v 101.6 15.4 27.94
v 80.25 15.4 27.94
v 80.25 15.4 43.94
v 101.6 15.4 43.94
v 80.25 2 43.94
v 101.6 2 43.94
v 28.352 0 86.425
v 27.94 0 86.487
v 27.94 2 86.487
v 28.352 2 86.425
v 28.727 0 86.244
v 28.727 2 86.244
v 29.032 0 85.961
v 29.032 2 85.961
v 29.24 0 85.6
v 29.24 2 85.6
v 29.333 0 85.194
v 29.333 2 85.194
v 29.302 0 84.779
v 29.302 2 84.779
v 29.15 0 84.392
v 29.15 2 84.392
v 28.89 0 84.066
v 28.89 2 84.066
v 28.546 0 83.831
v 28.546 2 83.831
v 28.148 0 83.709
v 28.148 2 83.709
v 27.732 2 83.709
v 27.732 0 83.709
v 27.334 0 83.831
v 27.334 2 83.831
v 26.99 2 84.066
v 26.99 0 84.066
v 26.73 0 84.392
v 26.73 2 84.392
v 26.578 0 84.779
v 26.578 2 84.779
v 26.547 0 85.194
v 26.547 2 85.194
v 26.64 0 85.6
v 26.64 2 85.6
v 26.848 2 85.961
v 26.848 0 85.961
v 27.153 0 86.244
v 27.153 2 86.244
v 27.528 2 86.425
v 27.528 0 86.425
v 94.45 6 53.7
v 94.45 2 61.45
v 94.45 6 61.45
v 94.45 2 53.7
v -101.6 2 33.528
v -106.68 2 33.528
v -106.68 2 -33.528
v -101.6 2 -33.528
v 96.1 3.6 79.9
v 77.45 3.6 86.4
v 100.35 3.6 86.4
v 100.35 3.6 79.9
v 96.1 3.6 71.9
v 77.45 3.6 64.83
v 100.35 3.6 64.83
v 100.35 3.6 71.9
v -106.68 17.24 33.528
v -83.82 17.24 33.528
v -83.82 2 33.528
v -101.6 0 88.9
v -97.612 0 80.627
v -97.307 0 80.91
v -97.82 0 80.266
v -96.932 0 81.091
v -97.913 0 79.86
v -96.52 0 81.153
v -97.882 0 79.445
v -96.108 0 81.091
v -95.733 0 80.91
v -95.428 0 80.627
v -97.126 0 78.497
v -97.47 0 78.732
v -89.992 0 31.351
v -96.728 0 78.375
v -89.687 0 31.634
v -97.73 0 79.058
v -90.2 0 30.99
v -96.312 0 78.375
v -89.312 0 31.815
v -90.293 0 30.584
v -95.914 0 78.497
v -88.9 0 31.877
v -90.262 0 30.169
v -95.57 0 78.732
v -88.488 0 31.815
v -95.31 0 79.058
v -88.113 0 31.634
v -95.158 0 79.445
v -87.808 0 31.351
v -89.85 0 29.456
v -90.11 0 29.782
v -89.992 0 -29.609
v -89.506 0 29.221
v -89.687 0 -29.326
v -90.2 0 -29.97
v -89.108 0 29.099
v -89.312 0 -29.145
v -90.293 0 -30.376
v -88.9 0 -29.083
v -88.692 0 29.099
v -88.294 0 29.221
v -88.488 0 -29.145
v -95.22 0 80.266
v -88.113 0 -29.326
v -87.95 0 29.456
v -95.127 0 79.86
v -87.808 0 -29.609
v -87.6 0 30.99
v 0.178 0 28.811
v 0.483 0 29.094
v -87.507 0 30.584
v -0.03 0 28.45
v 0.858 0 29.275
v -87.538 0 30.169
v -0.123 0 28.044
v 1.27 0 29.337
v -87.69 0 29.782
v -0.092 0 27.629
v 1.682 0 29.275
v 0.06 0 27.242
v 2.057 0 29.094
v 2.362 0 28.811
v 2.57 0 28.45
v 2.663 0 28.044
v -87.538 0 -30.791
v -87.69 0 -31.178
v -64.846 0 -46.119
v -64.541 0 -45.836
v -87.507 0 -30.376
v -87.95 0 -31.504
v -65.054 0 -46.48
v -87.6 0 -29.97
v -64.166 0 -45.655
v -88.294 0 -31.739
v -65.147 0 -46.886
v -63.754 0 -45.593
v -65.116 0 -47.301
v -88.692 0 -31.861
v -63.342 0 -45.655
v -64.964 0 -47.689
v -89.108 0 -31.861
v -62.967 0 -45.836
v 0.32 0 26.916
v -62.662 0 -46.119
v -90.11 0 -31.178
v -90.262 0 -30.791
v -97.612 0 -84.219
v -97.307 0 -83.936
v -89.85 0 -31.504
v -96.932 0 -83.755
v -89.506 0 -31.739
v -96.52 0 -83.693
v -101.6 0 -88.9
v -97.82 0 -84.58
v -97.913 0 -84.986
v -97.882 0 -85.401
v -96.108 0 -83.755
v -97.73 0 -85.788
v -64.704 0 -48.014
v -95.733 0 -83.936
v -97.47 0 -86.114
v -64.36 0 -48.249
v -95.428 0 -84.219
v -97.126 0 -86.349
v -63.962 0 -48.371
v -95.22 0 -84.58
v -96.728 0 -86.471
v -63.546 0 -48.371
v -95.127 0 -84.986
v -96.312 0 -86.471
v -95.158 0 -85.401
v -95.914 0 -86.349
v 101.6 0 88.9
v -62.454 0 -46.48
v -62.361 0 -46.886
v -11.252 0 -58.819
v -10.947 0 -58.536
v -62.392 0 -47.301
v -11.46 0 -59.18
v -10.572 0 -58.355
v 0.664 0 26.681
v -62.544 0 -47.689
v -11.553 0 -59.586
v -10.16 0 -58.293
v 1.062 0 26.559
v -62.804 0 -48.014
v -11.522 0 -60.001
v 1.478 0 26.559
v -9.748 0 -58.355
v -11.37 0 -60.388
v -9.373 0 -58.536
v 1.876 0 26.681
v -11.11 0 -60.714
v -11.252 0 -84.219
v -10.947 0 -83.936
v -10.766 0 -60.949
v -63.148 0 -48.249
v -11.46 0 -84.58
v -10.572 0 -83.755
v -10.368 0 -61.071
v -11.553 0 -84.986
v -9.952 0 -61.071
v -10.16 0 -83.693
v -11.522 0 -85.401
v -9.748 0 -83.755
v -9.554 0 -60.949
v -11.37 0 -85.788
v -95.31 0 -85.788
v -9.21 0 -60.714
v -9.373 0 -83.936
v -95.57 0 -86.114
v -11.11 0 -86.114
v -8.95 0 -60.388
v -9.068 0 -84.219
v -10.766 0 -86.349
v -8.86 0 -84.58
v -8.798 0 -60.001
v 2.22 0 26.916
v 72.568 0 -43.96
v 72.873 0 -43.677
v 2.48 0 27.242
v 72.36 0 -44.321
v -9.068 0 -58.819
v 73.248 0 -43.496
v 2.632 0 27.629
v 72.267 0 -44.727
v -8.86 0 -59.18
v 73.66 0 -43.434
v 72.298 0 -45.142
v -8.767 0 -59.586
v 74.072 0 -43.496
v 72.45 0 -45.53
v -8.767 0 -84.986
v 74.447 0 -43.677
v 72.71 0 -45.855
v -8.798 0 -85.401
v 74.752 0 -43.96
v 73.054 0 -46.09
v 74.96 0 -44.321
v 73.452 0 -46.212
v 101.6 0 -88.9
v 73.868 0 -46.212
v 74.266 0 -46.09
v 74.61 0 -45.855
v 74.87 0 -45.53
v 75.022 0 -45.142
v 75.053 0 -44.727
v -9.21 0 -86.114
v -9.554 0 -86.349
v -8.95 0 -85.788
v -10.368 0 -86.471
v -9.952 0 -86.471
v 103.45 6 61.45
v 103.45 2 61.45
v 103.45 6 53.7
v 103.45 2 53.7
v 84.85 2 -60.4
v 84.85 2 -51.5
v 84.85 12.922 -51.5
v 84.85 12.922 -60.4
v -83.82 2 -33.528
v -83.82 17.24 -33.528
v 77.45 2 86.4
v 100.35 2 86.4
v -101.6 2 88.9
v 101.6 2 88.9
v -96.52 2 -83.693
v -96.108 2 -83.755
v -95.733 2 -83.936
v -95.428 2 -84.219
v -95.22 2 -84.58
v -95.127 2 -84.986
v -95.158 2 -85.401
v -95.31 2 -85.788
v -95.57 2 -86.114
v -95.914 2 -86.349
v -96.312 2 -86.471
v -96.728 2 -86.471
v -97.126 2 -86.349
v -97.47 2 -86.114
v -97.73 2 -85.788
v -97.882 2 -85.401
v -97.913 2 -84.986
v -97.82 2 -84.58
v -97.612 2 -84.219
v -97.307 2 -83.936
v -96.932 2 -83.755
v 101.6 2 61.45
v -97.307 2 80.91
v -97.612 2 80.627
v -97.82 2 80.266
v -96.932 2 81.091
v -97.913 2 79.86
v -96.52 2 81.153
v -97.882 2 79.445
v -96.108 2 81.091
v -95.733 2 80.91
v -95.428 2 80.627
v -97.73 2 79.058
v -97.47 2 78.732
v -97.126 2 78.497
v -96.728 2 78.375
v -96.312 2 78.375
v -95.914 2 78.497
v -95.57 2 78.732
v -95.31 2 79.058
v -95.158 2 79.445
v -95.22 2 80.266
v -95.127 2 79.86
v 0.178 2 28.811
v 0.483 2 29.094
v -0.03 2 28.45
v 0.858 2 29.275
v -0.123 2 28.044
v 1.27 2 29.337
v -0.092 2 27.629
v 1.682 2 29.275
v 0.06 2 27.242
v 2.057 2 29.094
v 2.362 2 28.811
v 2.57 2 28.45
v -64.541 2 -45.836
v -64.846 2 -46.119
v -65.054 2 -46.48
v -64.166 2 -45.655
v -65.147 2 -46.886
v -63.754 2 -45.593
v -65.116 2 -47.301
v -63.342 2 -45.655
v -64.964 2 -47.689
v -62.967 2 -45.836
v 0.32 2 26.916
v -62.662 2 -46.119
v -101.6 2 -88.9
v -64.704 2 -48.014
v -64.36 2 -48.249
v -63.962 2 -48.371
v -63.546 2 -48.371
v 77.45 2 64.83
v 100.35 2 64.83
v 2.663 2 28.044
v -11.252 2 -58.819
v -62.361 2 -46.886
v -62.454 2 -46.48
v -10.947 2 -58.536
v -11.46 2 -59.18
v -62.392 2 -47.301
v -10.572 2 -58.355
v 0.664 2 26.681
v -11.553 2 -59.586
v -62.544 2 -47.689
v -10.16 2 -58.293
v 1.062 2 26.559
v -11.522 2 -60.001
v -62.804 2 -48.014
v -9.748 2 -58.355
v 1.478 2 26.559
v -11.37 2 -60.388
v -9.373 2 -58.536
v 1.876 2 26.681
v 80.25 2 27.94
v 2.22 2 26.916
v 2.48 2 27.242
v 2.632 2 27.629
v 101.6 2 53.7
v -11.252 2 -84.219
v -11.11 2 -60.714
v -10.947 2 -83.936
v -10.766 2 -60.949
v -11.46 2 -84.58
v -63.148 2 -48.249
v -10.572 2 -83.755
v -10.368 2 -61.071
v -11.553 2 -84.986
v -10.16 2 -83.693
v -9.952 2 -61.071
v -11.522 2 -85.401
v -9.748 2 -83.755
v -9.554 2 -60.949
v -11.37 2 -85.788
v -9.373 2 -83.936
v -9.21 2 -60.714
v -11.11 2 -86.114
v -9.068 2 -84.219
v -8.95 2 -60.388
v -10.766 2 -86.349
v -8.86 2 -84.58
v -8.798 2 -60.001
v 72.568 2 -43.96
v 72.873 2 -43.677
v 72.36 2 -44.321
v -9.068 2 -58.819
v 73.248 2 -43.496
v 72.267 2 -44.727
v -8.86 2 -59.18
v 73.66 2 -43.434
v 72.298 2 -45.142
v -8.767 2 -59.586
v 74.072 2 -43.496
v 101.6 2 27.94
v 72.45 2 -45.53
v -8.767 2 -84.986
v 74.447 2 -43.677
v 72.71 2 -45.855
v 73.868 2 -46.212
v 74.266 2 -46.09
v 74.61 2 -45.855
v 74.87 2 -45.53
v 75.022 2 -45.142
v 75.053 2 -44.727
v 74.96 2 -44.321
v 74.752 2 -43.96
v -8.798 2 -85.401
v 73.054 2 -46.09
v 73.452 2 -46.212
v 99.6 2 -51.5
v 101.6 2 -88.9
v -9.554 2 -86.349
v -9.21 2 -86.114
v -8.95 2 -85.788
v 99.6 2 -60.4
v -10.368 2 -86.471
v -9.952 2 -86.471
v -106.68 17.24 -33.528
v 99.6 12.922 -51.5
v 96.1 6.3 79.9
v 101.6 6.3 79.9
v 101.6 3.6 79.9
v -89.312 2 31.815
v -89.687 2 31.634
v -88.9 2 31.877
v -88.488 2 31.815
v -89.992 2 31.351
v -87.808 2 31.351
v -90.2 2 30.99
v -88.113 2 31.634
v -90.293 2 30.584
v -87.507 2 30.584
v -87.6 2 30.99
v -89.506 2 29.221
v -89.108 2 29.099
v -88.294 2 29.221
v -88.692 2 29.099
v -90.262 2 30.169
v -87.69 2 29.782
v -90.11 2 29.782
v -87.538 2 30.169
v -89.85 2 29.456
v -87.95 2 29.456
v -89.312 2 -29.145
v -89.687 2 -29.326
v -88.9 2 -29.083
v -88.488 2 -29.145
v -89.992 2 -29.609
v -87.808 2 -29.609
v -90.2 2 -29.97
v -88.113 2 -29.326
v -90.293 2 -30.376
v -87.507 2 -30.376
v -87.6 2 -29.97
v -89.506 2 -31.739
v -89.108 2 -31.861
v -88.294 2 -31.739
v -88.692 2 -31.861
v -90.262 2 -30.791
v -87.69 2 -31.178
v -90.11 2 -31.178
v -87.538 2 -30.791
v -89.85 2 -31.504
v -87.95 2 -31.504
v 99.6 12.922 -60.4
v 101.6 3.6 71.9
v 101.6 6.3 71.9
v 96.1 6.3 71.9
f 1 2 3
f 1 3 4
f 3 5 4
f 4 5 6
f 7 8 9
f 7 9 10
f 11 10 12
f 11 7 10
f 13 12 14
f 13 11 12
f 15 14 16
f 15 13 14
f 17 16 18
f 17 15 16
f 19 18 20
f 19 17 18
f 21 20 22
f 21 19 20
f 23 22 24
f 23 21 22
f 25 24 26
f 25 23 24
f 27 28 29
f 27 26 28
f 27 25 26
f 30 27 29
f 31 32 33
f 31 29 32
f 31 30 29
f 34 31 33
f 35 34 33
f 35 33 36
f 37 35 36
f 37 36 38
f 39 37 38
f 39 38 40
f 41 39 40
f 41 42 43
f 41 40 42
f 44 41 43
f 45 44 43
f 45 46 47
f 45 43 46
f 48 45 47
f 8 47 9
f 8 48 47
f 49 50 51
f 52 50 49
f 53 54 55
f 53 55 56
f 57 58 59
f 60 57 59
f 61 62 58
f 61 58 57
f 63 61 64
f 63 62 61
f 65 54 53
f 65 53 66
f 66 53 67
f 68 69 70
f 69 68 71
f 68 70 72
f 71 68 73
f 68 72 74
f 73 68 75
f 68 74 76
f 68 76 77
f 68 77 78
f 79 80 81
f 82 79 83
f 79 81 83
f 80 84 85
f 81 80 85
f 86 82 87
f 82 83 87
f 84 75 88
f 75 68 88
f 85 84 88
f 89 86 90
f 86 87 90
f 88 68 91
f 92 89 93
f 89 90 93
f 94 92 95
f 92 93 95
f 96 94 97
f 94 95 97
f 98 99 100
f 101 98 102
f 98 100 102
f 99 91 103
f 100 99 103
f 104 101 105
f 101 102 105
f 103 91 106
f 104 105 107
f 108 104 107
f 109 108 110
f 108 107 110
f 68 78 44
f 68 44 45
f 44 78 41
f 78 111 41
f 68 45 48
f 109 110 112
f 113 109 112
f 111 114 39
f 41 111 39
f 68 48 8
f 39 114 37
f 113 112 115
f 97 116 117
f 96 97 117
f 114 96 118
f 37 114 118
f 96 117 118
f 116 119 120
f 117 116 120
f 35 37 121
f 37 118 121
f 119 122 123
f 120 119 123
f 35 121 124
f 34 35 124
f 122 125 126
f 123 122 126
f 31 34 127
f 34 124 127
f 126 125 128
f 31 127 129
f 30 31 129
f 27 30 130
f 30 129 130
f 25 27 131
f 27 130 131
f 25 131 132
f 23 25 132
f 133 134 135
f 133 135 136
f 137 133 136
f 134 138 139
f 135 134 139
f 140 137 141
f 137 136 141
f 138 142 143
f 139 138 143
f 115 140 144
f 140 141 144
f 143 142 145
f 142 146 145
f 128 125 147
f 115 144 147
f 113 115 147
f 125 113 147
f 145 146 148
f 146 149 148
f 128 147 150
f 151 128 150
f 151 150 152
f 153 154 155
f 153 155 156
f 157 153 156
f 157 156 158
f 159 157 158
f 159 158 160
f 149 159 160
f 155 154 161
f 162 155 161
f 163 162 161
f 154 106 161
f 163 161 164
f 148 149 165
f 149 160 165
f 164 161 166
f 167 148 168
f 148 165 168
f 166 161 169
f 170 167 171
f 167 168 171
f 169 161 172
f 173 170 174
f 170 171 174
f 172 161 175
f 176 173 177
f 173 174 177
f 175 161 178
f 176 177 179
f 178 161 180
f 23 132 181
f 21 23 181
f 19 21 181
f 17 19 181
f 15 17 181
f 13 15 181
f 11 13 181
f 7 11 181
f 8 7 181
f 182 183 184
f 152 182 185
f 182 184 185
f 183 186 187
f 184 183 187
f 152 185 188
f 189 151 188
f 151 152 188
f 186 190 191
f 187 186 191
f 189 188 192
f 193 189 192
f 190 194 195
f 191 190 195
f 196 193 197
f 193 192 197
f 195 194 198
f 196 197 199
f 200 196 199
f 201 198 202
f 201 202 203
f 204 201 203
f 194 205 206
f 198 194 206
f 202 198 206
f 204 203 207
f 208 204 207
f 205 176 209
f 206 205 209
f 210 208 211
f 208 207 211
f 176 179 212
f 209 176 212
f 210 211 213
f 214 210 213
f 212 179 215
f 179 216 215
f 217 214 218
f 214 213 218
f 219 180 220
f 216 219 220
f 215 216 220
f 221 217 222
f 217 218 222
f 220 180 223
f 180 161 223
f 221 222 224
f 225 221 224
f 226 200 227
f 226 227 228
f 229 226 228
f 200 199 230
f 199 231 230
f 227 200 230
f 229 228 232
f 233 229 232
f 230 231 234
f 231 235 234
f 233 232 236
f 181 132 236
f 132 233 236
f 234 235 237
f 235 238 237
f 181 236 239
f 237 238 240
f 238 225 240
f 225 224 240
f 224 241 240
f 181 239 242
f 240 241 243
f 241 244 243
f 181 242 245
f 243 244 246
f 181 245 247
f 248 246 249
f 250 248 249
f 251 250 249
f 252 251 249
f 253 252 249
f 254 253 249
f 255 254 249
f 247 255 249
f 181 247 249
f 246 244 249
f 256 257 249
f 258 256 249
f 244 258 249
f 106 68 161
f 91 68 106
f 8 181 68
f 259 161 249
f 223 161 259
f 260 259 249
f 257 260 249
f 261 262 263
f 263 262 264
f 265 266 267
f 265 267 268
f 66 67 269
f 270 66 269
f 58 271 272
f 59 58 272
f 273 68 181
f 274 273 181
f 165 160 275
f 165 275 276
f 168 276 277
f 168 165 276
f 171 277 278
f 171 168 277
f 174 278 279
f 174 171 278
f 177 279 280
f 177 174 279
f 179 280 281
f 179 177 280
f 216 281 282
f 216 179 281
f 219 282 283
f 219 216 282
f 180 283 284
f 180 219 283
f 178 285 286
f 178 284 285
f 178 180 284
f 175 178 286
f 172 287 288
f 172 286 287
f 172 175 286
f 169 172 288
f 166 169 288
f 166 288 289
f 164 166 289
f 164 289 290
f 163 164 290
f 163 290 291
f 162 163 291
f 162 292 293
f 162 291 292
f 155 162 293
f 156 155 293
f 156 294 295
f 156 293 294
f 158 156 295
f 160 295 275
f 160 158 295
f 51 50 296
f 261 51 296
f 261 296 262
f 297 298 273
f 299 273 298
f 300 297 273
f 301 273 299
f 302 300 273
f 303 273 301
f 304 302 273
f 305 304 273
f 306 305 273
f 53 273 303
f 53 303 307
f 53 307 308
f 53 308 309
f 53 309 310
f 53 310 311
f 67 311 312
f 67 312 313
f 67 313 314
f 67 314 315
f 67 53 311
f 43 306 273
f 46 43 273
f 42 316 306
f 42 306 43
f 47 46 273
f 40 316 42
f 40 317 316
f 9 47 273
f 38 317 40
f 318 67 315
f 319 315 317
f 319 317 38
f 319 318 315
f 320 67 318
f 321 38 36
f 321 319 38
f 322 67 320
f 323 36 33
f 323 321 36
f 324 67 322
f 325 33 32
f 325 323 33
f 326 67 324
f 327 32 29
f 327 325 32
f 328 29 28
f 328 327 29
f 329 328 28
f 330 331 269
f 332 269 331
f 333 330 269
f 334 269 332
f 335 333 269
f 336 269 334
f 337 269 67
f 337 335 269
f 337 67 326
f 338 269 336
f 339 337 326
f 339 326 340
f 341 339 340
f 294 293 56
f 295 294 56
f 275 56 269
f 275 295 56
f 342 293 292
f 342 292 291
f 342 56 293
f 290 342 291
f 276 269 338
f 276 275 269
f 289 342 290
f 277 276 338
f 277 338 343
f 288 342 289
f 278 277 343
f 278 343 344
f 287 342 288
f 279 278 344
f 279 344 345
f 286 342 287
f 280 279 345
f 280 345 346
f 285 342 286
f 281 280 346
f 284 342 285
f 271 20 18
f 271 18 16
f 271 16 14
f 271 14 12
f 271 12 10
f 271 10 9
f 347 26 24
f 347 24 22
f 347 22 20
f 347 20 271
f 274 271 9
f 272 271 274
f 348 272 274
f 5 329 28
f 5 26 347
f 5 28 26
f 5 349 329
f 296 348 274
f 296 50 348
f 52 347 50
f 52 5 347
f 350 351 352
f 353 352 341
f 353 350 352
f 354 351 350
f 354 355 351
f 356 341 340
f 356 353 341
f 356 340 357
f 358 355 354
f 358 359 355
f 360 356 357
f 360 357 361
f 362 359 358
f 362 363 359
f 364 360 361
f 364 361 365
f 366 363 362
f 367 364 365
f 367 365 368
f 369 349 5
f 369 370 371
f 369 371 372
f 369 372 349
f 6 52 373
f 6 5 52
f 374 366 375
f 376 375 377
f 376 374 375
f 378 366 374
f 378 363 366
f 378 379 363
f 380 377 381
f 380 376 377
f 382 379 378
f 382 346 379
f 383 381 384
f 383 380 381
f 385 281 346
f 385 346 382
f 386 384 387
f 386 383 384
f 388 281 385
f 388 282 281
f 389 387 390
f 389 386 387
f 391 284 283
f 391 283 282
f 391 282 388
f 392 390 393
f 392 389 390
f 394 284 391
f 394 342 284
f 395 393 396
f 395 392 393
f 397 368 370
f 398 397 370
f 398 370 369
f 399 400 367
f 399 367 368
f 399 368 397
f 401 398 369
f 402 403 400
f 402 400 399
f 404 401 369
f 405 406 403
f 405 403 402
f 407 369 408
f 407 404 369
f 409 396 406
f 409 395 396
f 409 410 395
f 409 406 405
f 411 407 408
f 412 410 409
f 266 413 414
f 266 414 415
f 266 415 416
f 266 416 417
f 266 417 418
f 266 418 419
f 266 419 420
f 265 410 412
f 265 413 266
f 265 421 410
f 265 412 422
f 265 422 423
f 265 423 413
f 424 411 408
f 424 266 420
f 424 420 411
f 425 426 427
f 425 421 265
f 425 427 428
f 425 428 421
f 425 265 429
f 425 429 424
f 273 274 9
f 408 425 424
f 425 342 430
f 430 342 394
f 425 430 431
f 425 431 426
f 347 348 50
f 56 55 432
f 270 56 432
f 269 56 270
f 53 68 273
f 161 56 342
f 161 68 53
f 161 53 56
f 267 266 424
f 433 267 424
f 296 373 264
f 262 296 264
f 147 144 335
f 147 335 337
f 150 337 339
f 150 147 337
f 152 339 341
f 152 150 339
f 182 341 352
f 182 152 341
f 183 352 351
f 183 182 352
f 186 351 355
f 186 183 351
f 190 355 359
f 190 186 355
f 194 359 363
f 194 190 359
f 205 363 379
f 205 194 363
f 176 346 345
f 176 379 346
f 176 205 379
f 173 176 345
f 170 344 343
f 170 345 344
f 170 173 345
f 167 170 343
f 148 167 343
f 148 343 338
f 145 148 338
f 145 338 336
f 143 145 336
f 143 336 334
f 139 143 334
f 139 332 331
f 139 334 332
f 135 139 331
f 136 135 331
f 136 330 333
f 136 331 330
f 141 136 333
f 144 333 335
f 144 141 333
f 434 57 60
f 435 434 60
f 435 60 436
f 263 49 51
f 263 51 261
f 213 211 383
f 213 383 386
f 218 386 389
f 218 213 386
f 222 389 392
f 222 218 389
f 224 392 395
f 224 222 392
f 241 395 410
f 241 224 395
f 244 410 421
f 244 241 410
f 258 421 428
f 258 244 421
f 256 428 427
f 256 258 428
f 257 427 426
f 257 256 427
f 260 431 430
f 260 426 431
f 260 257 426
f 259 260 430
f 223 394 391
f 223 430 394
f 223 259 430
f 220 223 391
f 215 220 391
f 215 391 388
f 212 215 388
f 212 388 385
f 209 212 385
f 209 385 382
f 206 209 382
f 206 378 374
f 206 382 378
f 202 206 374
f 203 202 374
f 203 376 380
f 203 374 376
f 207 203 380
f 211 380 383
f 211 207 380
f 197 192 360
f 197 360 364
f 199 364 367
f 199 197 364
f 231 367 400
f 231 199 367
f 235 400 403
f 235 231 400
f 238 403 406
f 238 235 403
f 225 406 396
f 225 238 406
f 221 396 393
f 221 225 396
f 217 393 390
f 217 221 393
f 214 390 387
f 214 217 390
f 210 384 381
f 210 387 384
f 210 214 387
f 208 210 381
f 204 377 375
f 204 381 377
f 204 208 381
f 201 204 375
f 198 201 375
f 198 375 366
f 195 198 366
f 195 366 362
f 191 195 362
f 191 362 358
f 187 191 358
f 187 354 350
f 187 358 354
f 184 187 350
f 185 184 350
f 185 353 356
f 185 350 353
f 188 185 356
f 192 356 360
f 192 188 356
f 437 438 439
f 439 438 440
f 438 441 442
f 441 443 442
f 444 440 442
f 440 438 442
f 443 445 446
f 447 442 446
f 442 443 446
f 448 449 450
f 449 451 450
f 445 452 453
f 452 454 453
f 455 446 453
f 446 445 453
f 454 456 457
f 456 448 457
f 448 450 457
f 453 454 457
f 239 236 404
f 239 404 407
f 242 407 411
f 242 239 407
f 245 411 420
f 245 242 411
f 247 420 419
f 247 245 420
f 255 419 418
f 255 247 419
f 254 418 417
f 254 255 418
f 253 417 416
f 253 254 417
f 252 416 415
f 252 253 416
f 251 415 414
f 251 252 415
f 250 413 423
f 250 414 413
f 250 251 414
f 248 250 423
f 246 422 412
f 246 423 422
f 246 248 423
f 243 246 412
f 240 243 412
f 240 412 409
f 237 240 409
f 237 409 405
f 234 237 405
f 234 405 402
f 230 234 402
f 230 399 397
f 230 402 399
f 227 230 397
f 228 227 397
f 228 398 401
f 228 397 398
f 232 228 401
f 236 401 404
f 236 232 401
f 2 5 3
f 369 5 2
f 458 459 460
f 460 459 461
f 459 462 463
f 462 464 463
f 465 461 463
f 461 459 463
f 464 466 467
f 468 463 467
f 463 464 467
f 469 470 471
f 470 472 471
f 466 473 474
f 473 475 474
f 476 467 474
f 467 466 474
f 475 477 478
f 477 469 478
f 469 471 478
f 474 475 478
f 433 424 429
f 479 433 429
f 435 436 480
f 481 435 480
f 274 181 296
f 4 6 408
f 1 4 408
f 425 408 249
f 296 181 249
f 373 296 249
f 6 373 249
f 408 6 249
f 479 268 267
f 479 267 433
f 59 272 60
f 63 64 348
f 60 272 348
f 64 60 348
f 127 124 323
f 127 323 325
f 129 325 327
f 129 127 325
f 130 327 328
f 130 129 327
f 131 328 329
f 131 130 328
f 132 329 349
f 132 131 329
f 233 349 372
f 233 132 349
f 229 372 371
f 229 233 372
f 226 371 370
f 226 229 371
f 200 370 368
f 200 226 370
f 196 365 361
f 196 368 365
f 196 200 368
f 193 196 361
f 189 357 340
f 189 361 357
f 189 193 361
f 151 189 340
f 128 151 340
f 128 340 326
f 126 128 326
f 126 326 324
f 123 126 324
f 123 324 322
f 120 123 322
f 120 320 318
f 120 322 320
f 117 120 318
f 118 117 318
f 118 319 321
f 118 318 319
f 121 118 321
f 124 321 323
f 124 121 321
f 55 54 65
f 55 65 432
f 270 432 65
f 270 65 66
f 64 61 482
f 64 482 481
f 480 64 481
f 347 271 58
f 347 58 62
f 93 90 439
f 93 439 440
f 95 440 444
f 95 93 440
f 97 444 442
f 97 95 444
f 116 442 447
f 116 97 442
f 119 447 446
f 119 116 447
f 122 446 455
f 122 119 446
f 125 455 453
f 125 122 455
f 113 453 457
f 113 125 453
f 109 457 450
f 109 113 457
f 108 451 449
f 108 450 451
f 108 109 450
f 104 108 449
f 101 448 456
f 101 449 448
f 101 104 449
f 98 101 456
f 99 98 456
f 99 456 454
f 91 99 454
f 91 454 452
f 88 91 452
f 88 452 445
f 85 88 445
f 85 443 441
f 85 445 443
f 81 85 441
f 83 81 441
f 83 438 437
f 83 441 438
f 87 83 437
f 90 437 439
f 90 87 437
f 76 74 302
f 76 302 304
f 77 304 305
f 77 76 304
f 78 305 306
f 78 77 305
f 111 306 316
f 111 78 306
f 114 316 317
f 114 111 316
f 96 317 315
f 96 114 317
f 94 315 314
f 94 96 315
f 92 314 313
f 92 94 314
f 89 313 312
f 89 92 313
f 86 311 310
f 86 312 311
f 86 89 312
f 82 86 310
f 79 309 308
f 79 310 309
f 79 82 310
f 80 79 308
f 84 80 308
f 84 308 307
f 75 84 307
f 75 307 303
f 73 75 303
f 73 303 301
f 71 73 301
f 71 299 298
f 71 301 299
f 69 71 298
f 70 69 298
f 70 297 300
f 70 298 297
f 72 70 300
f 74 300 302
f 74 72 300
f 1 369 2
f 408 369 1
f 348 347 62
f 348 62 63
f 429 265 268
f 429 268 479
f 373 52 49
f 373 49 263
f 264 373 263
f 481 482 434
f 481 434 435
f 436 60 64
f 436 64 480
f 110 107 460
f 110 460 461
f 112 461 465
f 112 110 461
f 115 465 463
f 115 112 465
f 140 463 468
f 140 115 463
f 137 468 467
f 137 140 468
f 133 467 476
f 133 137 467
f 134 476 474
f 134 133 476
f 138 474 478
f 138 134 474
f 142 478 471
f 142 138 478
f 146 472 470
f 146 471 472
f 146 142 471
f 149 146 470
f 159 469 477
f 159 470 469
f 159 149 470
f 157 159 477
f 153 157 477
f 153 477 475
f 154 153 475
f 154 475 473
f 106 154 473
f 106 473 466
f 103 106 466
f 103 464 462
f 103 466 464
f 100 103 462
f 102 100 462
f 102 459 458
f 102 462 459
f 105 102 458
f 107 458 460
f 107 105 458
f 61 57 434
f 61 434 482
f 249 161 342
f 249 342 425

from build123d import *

# Parameters (mm, degrees)
SKETCH1_W               = 203.2
SKETCH1_H               = 177.8
BOSS_EXTRUDE1_DEPTH     = 2
SKETCH3_W               = 21.35
SKETCH3_H               = 16
BOSS_EXTRUDE2_DEPTH     = 13.4
CUT_EXTRUDE1_DEPTH      = 136.666244881
CUT_EXTRUDE1_DEPTH_BACK = 136.666244881
SKETCH2_R               = 1.397
SKETCH4_W               = 22.86
SKETCH4_H               = 67.056
BOSS_EXTRUDE3_DEPTH     = 15.24
SKETCH5_W               = 14.75
SKETCH5_H               = 8.9
BOSS_EXTRUDE4_DEPTH     = 10.922
SKETCH7_W               = 9
SKETCH7_H               = 7.75
BOSS_EXTRUDE5_DEPTH     = 4
SKETCH8_W               = 22.9
SKETCH8_H               = 21.57
BOSS_EXTRUDE6_DEPTH     = 1.6
SKETCH9_W               = 5.5
SKETCH9_H               = 8
BOSS_EXTRUDE7_DEPTH     = 2.7


with BuildPart() as part:
    # Sketch1 → Boss-Extrude1 (new body)
    with BuildSketch(Plane(origin=(0, 0, 0), x_dir=(1, 0, 0), z_dir=(0, 1, 0))):
        Rectangle(SKETCH1_W, SKETCH1_H)
    extrude(amount=BOSS_EXTRUDE1_DEPTH)

    # Sketch3 → Boss-Extrude2 (add)
    with BuildSketch(Plane(origin=(0, 2, 0), x_dir=(1, 0, 0), z_dir=(0, 1, 0))):
        with Locations((90.925, -35.94)):
            Rectangle(SKETCH3_W, SKETCH3_H)
    extrude(amount=BOSS_EXTRUDE2_DEPTH)

    # Sketch2 → Cut-Extrude1 (cut, two sides: drawn at the far end of the back side and taken through both)
    with BuildSketch(Plane(origin=(0, 2, 0), x_dir=(1, 0, 0), z_dir=(0, 1, 0)).offset(-CUT_EXTRUDE1_DEPTH_BACK)):
        with Locations(Location((-96.52, 85.09, 0), (0, 0, 270))):
            Circle(SKETCH2_R)
        with Locations(Location((-10.16, 85.09, 0), (0, 0, 270))):
            Circle(SKETCH2_R)
        with Locations(Location((-10.16, 59.69, 0), (0, 0, 270))):
            Circle(SKETCH2_R)
        with Locations(Location((73.66, 44.831, 0), (0, 0, 270))):
            Circle(SKETCH2_R)
        with Locations(Location((-63.754, 46.99, 0), (0, 0, 270))):
            Circle(SKETCH2_R)
        with Locations(Location((1.27, -27.94, 0), (0, 0, 270))):
            Circle(SKETCH2_R)
        with Locations(Location((-96.52, -79.756, 0), (0, 0, 270))):
            Circle(SKETCH2_R)
        with Locations(Location((27.94, -85.09, 0), (0, 0, 270))):
            Circle(SKETCH2_R)
        with Locations(Location((-88.9, -30.48, 0), (0, 0, 270))):
            Circle(SKETCH2_R)
        with Locations(Location((-88.9, 30.48, 0), (0, 0, 270))):
            Circle(SKETCH2_R)
    extrude(amount=CUT_EXTRUDE1_DEPTH + CUT_EXTRUDE1_DEPTH_BACK, mode=Mode.SUBTRACT)

    # Sketch4 → Boss-Extrude3 (add)
    with BuildSketch(Plane(origin=(0, 2, 0), x_dir=(1, 0, 0), z_dir=(0, 1, 0))):
        with Locations((-95.25, 0)):
            Rectangle(SKETCH4_W, SKETCH4_H)
    extrude(amount=BOSS_EXTRUDE3_DEPTH)

    # Sketch5 → Boss-Extrude4 (add)
    with BuildSketch(Plane(origin=(0, 2, 0), x_dir=(1, 0, 0), z_dir=(0, 1, 0))):
        with Locations((92.225, 55.95)):
            Rectangle(SKETCH5_W, SKETCH5_H)
    extrude(amount=BOSS_EXTRUDE4_DEPTH)

    # Sketch7 → Boss-Extrude5 (add)
    with BuildSketch(Plane(origin=(0, 2, 0), x_dir=(1, 0, 0), z_dir=(0, 1, 0))):
        with Locations((98.95, -57.575)):
            Rectangle(SKETCH7_W, SKETCH7_H)
    extrude(amount=BOSS_EXTRUDE5_DEPTH)

    # Sketch8 → Boss-Extrude6 (add)
    with BuildSketch(Plane(origin=(0, 2, 0), x_dir=(1, 0, 0), z_dir=(0, 1, 0))):
        with Locations((88.9, -75.615)):
            Rectangle(SKETCH8_W, SKETCH8_H)
    extrude(amount=BOSS_EXTRUDE6_DEPTH)

    # Sketch9 → Boss-Extrude7 (add)
    with BuildSketch(Plane(origin=(0, 3.6, 0), x_dir=(1, 0, 0), z_dir=(0, 1, 0))):
        with Locations((98.85, -75.9)):
            Rectangle(SKETCH9_W, SKETCH9_H)
    extrude(amount=BOSS_EXTRUDE7_DEPTH)


solid = part.part
